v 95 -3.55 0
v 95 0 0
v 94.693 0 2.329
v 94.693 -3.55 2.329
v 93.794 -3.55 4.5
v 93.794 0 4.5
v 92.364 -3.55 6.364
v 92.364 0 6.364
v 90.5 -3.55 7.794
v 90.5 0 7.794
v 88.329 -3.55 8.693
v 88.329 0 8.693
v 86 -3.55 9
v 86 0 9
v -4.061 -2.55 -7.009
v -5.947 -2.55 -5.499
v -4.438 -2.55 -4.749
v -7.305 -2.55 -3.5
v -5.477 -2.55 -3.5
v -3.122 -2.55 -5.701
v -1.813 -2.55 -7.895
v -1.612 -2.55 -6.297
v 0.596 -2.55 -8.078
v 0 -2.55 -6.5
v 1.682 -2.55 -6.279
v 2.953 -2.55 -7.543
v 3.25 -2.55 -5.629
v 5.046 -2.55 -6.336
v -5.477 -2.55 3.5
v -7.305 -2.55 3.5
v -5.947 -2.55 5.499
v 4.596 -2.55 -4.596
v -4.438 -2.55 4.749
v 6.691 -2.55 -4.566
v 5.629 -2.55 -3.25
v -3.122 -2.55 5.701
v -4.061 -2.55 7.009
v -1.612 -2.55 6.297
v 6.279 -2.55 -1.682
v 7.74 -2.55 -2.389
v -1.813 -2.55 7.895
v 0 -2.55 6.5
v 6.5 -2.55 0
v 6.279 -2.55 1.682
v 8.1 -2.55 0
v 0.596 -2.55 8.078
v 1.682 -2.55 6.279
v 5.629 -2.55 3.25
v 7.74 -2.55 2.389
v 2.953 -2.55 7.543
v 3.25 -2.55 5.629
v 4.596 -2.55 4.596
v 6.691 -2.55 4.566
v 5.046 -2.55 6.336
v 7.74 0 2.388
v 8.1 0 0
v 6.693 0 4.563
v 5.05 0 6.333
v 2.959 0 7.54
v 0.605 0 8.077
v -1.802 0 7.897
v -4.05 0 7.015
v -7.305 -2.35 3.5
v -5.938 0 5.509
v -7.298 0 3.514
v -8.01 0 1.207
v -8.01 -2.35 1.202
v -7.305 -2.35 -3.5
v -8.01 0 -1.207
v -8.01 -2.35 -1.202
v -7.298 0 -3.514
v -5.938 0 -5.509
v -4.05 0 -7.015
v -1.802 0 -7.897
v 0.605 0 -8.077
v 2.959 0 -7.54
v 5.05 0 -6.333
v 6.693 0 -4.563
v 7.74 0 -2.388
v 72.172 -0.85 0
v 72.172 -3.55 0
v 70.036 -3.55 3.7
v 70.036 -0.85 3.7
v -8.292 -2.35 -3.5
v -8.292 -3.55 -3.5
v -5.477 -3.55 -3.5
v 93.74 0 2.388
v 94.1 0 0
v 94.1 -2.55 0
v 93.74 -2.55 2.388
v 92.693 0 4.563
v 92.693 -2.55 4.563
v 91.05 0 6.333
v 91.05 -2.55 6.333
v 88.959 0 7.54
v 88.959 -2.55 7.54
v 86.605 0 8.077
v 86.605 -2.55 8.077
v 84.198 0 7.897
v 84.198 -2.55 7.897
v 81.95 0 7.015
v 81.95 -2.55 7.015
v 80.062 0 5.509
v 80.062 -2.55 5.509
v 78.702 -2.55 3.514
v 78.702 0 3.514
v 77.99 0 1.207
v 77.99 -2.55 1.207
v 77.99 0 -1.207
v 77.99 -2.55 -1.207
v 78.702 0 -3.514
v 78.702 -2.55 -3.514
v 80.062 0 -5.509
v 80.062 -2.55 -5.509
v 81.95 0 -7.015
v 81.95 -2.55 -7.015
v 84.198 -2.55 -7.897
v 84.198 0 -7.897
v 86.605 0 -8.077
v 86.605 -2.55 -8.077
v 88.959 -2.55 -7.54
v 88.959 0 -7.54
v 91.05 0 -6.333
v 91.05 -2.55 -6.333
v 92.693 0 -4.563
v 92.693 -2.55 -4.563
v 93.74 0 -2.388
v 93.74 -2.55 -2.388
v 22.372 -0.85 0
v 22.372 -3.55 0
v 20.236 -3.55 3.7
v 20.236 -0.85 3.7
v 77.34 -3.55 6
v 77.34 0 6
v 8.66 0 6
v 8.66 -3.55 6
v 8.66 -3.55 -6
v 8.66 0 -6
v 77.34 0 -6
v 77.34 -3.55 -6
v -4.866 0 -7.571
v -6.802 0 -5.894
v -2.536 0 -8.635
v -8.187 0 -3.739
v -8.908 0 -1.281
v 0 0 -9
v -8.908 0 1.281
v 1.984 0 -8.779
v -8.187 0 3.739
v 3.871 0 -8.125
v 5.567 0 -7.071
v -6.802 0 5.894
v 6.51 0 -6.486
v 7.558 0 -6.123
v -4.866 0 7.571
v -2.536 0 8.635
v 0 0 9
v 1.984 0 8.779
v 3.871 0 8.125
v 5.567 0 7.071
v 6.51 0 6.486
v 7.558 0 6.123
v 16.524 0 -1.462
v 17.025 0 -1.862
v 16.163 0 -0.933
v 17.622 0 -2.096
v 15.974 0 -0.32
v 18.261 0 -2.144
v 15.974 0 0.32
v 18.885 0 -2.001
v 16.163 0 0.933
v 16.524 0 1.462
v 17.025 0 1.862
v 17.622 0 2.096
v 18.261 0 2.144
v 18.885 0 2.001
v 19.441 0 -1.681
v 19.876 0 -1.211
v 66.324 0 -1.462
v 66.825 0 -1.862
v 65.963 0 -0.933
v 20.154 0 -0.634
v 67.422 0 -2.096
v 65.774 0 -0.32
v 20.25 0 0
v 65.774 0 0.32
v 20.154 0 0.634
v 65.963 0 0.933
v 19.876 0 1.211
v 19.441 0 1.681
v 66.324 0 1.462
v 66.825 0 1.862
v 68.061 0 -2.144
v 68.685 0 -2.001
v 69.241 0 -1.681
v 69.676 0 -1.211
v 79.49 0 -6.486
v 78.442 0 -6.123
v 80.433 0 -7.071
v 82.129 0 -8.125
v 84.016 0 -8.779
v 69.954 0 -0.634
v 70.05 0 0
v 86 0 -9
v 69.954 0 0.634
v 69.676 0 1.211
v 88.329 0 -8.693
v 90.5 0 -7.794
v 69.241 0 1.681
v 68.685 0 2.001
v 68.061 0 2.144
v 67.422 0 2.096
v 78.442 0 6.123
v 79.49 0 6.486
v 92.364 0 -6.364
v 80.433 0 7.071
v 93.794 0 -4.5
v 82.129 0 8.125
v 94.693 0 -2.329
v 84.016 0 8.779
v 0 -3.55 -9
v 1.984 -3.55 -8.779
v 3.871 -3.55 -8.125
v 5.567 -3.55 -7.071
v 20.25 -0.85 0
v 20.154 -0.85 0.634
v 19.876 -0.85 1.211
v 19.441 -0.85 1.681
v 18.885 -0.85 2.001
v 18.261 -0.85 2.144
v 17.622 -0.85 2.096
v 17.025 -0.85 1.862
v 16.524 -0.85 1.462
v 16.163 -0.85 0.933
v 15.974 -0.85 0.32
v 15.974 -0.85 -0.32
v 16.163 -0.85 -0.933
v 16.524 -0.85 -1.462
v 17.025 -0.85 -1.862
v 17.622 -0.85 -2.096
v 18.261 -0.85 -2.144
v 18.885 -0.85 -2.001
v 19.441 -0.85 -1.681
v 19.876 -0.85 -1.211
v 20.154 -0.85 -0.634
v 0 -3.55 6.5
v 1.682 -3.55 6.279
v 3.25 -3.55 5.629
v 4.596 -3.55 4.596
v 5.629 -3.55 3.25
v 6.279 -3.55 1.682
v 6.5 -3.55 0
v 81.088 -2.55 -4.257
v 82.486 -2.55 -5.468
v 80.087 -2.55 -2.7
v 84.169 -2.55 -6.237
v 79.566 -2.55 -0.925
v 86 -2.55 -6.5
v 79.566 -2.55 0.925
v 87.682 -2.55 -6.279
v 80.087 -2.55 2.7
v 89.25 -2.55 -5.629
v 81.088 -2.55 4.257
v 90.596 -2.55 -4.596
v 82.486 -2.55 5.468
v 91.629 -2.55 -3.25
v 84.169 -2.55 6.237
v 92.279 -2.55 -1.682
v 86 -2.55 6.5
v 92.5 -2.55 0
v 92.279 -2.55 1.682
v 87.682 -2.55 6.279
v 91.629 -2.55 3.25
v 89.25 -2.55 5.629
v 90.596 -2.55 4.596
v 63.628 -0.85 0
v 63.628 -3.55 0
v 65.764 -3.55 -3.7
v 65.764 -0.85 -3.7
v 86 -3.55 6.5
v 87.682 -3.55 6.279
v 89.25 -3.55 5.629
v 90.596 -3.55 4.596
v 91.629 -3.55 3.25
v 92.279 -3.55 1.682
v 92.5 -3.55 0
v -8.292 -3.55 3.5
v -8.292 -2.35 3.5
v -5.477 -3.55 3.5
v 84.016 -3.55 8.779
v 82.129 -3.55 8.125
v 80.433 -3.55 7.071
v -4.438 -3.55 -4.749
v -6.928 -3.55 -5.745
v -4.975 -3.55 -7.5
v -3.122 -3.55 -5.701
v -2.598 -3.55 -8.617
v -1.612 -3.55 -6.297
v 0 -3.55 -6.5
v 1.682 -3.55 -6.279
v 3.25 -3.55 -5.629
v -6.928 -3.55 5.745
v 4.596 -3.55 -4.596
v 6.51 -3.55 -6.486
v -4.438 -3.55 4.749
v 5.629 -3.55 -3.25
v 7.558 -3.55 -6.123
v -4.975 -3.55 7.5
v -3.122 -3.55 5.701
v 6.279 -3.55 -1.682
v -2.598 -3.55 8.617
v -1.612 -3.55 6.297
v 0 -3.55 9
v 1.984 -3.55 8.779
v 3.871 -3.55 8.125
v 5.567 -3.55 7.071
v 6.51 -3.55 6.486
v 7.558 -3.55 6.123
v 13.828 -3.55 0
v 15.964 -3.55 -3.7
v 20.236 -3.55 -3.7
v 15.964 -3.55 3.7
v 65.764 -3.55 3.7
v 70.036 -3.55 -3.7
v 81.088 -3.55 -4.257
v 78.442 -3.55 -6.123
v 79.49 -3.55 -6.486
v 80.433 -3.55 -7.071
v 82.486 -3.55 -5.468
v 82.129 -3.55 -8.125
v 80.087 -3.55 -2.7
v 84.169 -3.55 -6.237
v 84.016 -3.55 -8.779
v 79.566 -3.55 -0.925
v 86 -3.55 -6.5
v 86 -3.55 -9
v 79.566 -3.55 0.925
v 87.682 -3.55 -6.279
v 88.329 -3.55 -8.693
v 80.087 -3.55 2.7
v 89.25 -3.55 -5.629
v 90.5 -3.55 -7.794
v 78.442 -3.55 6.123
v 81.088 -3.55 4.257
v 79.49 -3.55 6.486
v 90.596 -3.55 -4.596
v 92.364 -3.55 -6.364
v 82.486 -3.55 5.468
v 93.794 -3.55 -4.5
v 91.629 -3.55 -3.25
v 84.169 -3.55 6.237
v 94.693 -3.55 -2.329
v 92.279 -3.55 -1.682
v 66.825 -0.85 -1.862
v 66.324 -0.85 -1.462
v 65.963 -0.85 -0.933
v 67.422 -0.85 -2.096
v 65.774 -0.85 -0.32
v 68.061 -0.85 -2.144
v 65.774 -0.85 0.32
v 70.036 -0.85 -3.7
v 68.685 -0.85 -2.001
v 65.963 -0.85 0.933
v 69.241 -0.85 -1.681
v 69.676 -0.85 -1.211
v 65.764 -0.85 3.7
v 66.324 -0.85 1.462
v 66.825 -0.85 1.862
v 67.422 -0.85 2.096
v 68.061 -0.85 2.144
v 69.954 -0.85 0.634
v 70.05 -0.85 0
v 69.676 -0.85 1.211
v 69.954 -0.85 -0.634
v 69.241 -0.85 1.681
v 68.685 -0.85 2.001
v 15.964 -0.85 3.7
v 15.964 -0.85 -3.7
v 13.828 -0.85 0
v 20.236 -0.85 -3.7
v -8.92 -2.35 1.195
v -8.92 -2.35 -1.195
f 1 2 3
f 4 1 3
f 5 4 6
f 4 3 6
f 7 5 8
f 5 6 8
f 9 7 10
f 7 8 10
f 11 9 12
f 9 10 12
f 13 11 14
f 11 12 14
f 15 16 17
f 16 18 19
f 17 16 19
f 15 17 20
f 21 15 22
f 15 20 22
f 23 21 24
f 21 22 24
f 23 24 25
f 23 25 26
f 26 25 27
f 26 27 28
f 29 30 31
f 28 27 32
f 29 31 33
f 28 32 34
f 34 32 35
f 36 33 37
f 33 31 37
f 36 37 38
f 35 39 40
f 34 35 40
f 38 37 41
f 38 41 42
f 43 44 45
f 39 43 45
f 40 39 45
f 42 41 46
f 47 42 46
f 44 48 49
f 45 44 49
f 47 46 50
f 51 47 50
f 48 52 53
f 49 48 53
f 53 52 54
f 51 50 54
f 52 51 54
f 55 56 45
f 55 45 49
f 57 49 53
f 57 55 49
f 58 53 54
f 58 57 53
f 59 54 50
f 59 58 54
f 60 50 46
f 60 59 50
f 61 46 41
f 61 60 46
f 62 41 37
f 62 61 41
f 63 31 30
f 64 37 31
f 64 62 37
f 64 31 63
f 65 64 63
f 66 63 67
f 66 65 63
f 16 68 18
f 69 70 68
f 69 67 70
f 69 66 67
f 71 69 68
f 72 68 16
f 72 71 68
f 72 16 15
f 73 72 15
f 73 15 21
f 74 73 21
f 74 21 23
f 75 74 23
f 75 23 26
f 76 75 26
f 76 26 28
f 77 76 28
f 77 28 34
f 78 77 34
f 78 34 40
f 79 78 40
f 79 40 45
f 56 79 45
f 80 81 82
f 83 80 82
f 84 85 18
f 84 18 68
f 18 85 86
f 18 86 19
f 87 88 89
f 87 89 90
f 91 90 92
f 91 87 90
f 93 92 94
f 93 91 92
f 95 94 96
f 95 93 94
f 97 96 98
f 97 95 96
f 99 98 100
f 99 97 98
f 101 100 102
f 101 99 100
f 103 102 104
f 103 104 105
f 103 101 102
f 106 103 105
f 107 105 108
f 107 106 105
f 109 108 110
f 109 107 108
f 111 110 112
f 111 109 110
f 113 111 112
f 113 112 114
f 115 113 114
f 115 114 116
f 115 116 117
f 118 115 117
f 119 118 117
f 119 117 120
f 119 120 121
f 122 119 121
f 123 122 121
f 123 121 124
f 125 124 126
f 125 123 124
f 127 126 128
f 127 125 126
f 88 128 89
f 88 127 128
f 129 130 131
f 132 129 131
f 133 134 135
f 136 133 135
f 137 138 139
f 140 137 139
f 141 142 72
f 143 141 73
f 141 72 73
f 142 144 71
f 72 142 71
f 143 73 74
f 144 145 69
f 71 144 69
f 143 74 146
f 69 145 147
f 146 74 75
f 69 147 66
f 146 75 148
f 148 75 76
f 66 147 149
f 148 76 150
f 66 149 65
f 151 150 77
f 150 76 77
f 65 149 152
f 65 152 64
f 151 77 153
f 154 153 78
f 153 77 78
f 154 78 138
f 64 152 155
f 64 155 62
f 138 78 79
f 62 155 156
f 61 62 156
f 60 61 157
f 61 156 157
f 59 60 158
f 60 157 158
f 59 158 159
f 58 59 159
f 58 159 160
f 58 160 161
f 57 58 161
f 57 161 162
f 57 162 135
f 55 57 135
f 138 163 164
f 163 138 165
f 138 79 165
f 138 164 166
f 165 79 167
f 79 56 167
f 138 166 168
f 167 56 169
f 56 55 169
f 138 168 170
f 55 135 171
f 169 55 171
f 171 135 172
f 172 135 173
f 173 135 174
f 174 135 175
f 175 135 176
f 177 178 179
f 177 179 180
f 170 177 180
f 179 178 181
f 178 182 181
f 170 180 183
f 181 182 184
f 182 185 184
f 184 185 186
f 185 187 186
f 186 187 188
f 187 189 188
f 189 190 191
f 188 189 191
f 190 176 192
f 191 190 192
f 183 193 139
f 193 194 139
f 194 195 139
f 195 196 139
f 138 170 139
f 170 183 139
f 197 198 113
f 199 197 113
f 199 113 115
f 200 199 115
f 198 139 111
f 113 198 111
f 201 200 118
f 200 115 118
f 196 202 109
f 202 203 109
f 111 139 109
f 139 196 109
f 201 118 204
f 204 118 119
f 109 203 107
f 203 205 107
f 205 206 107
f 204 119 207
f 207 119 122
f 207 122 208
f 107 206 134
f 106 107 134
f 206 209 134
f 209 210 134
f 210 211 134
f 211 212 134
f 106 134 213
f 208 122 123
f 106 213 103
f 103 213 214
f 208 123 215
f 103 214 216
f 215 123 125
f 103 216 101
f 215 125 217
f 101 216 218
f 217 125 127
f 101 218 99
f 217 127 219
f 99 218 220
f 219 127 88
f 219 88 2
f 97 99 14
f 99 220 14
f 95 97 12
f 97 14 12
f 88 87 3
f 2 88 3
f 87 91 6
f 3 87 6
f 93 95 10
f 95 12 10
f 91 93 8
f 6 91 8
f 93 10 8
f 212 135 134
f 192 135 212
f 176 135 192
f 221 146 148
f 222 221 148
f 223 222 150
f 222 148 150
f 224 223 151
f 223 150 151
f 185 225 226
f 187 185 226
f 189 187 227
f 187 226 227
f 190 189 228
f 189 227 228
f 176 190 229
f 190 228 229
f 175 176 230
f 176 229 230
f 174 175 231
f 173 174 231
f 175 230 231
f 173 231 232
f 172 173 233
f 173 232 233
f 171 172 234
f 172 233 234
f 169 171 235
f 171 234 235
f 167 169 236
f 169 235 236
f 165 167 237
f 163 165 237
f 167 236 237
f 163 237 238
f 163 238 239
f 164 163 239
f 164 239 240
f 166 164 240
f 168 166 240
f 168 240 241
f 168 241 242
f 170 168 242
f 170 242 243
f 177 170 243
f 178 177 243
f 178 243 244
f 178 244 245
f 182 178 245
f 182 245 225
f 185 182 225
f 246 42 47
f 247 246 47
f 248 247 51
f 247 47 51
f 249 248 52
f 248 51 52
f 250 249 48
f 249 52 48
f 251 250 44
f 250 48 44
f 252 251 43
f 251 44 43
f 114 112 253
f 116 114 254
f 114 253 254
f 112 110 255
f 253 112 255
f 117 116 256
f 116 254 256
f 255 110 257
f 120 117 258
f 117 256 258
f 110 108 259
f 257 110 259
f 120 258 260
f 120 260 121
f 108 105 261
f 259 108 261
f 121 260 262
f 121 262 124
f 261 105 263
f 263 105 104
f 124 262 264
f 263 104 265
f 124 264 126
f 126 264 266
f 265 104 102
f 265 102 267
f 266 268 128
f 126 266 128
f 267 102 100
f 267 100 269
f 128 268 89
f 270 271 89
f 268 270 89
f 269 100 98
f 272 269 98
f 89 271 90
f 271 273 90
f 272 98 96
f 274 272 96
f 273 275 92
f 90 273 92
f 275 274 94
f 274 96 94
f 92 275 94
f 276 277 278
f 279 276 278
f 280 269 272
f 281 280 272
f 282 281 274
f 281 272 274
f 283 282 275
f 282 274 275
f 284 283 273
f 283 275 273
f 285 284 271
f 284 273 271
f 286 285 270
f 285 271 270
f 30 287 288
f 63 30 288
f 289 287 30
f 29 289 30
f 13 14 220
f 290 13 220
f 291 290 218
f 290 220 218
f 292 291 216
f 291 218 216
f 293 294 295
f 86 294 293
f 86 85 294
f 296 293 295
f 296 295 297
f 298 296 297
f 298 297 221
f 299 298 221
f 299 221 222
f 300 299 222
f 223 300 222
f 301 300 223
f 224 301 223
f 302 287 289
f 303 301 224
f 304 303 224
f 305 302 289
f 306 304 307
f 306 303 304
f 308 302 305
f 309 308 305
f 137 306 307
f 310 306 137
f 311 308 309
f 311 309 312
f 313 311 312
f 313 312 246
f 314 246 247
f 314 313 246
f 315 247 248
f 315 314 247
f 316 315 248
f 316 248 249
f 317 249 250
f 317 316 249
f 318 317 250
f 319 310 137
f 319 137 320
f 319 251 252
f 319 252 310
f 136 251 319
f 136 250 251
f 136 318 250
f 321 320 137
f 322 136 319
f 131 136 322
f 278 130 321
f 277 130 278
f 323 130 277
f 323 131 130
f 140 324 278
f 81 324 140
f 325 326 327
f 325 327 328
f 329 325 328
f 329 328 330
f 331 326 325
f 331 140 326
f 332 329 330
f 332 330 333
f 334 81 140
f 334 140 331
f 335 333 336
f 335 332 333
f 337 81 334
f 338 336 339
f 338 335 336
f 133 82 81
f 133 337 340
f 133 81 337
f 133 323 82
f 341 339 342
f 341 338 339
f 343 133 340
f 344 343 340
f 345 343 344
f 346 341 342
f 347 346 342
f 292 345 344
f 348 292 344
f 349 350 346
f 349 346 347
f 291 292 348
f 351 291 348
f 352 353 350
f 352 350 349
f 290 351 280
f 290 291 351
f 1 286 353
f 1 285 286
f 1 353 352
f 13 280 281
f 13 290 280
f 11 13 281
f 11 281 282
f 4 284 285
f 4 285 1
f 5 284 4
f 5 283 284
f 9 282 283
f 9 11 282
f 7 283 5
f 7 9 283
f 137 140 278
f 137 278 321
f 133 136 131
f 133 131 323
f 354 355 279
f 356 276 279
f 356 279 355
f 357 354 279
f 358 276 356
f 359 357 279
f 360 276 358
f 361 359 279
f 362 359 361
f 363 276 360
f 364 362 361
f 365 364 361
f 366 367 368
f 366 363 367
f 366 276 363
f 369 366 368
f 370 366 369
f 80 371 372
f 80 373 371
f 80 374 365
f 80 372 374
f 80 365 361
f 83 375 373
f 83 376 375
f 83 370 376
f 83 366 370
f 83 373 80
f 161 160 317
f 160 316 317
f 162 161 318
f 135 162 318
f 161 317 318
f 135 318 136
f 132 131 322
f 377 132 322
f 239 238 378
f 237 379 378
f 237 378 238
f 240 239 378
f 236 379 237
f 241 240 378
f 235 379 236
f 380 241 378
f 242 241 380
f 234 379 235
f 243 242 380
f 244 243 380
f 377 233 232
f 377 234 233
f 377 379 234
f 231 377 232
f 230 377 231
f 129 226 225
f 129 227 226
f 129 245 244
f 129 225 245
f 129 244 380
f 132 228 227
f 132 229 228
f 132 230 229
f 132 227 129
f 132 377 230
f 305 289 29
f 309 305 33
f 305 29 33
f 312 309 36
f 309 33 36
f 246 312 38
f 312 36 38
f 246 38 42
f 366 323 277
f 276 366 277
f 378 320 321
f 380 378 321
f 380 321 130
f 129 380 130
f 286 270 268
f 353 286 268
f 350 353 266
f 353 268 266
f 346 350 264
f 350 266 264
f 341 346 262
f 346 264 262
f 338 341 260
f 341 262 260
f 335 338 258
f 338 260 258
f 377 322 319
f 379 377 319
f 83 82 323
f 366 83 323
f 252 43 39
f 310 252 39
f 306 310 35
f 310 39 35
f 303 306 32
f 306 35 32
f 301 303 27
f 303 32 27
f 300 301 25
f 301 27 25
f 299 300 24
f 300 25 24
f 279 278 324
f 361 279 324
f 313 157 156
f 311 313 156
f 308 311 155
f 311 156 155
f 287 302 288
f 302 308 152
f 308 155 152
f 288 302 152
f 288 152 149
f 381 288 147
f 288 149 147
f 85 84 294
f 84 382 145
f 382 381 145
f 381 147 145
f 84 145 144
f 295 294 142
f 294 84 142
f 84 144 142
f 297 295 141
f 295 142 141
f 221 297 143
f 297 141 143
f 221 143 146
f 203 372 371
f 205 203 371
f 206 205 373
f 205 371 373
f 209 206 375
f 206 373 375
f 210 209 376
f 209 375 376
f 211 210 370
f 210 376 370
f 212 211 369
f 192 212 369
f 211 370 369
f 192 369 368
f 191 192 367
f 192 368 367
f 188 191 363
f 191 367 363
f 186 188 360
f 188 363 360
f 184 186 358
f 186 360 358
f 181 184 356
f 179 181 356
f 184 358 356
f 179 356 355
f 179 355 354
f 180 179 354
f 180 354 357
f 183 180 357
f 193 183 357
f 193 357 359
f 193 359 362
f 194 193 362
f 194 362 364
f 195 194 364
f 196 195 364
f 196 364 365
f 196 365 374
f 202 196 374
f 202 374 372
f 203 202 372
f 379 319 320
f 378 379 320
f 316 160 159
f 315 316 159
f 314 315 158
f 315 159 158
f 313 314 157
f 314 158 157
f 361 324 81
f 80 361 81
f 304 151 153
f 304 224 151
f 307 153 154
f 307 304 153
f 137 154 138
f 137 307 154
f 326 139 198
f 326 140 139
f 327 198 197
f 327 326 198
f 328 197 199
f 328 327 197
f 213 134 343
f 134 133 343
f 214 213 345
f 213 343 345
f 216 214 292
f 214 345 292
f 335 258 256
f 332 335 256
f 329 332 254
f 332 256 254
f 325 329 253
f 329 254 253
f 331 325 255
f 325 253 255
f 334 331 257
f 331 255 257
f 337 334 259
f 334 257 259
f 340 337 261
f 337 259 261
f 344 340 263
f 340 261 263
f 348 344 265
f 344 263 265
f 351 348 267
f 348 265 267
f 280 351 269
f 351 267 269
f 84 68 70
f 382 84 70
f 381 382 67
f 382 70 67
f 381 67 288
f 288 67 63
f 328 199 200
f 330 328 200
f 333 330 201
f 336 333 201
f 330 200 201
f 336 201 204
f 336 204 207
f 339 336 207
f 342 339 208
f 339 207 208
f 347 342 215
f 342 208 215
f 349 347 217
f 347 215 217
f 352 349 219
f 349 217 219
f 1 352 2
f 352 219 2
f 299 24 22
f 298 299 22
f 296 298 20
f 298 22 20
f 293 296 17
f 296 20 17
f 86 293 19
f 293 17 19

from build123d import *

# Parameters (mm, degrees)
F1_DEPTH = 3.55
F2_R     = 8.1
F3_DEPTH = 2.55
F4_R     = 5
F5_R     = 2.15
F6_DEPTH = 2.7
F7_DEPTH = 3.551
F8_W     = 1.2
F8_H     = 7
F9_DEPTH = 200


# Not quite as in the source:
# - a feature names something its author has since deleted; it is built from what else it names


with BuildPart() as f1:
    # F0 (on Front) → F1 (new body)
    with BuildSketch(Plane.XZ):
        with BuildLine():
            Line((0, 6.5), (0, 9))
            ThreePointArc((0, 9), (-9, 0), (0, -9))
            Line((0, -9), (0, -6.5))
            ThreePointArc((0, -6.5), (-6.5, 0), (0, 6.5))
        make_face()
        with BuildLine():
            ThreePointArc((6.7082039325, -6), (8.4075512307, -3.211398808), (9, 0))
            ThreePointArc((9, 0), (8.4075512307, 3.211398808), (6.7082039325, 6))
            ThreePointArc((6.7082039325, 6), (3.6742346142, 8.2158383626), (0, 9))
            Line((0, 9), (0, 6.5))
            ThreePointArc((0, 6.5), (4.5961940777, 4.5961940777), (6.5, 0))
            ThreePointArc((6.5, 0), (4.5961940777, -4.5961940777), (0, -6.5))
            Line((0, -6.5), (0, -9))
            ThreePointArc((0, -9), (3.6742346142, -8.2158383626), (6.7082039325, -6))
        make_face()
        with BuildLine():
            ThreePointArc((86, 9), (82.3257653858, 8.2158383626), (79.2917960675, 6))
            ThreePointArc((79.2917960675, 6), (77, 0), (79.2917960675, -6))
            ThreePointArc((79.2917960675, -6), (82.3257653858, -8.2158383626), (86, -9))
            Line((86, -9), (86, -6.5))
            ThreePointArc((86, -6.5), (79.5, 0), (86, 6.5))
            Line((86, 6.5), (86, 9))
        make_face()
        with BuildLine():
            ThreePointArc((95, 0), (92.3639610307, 6.3639610307), (86, 9))
            Line((86, 9), (86, 6.5))
            ThreePointArc((86, 6.5), (90.5961940777, 4.5961940777), (92.5, 0))
            ThreePointArc((92.5, 0), (90.5961940777, -4.5961940777), (86, -6.5))
            Line((86, -6.5), (86, -9))
            ThreePointArc((86, -9), (92.3639610307, -6.3639610307), (95, 0))
        make_face()
        with BuildLine():
            ThreePointArc((6.7082039325, 6), (8.4075512307, 3.211398808), (9, 0))
            ThreePointArc((9, 0), (8.4075512307, -3.211398808), (6.7082039325, -6))
            Line((6.7082039325, -6), (79.2917960675, -6))
            ThreePointArc((79.2917960675, -6), (77, 0), (79.2917960675, 6))
            Line((79.2917960675, 6), (6.7082039325, 6))
        make_face()
    extrude(amount=F1_DEPTH)

    # F2 (on face) → F3 (cut)
    with BuildSketch(Plane.XZ):
        Circle(F2_R)
        with Locations((86, 0)):
            Circle(F2_R)
    extrude(amount=F3_DEPTH, mode=Mode.SUBTRACT)

    # F4
    f4_edges = [f1.edges().sort_by_distance(p)[0] for p in [
        (6.708204, -1.775, -6),
        (6.708204, -1.775, 6),
        (79.291796, -1.775, 6),
        (79.291796, -1.775, -6),
    ]]
    fillet(f4_edges, radius=F4_R)

    # F5 (on face) → F6 (cut)
    with BuildSketch(Plane.XZ.offset(3.55)):
        Polygon((22.372391992, 0), (20.236195996, 3.7), (15.963804004, 3.7), (13.827608008, 0), (15.963804004, -3.7), (20.236195996, -3.7), align=None)
        with Locations((18.1, 0)):
            Circle(F5_R, mode=Mode.SUBTRACT)
        Polygon((63.627608008, 0), (65.763804004, -3.7), (70.036195996, -3.7), (72.172391992, 0), (70.036195996, 3.7), (65.763804004, 3.7), align=None)
        with Locations((67.9, 0)):
            Circle(F5_R, mode=Mode.SUBTRACT)
    extrude(amount=-F6_DEPTH, mode=Mode.SUBTRACT)

    # F5 (on face) → F7 (cut, through all)
    with BuildSketch(Plane.XZ.offset(3.55)):
        with Locations((18.1, 0)):
            Circle(F5_R)
        with Locations((67.9, 0)):
            Circle(F5_R)
    extrude(amount=-F7_DEPTH, mode=Mode.SUBTRACT)

    # F8 (on Right) → F9 (cut)
    with BuildSketch(Plane.YZ):
        with Locations((-2.95, 0)):
            Rectangle(F8_W, F8_H)
    extrude(amount=-F9_DEPTH, mode=Mode.SUBTRACT)


solid = f1.part
